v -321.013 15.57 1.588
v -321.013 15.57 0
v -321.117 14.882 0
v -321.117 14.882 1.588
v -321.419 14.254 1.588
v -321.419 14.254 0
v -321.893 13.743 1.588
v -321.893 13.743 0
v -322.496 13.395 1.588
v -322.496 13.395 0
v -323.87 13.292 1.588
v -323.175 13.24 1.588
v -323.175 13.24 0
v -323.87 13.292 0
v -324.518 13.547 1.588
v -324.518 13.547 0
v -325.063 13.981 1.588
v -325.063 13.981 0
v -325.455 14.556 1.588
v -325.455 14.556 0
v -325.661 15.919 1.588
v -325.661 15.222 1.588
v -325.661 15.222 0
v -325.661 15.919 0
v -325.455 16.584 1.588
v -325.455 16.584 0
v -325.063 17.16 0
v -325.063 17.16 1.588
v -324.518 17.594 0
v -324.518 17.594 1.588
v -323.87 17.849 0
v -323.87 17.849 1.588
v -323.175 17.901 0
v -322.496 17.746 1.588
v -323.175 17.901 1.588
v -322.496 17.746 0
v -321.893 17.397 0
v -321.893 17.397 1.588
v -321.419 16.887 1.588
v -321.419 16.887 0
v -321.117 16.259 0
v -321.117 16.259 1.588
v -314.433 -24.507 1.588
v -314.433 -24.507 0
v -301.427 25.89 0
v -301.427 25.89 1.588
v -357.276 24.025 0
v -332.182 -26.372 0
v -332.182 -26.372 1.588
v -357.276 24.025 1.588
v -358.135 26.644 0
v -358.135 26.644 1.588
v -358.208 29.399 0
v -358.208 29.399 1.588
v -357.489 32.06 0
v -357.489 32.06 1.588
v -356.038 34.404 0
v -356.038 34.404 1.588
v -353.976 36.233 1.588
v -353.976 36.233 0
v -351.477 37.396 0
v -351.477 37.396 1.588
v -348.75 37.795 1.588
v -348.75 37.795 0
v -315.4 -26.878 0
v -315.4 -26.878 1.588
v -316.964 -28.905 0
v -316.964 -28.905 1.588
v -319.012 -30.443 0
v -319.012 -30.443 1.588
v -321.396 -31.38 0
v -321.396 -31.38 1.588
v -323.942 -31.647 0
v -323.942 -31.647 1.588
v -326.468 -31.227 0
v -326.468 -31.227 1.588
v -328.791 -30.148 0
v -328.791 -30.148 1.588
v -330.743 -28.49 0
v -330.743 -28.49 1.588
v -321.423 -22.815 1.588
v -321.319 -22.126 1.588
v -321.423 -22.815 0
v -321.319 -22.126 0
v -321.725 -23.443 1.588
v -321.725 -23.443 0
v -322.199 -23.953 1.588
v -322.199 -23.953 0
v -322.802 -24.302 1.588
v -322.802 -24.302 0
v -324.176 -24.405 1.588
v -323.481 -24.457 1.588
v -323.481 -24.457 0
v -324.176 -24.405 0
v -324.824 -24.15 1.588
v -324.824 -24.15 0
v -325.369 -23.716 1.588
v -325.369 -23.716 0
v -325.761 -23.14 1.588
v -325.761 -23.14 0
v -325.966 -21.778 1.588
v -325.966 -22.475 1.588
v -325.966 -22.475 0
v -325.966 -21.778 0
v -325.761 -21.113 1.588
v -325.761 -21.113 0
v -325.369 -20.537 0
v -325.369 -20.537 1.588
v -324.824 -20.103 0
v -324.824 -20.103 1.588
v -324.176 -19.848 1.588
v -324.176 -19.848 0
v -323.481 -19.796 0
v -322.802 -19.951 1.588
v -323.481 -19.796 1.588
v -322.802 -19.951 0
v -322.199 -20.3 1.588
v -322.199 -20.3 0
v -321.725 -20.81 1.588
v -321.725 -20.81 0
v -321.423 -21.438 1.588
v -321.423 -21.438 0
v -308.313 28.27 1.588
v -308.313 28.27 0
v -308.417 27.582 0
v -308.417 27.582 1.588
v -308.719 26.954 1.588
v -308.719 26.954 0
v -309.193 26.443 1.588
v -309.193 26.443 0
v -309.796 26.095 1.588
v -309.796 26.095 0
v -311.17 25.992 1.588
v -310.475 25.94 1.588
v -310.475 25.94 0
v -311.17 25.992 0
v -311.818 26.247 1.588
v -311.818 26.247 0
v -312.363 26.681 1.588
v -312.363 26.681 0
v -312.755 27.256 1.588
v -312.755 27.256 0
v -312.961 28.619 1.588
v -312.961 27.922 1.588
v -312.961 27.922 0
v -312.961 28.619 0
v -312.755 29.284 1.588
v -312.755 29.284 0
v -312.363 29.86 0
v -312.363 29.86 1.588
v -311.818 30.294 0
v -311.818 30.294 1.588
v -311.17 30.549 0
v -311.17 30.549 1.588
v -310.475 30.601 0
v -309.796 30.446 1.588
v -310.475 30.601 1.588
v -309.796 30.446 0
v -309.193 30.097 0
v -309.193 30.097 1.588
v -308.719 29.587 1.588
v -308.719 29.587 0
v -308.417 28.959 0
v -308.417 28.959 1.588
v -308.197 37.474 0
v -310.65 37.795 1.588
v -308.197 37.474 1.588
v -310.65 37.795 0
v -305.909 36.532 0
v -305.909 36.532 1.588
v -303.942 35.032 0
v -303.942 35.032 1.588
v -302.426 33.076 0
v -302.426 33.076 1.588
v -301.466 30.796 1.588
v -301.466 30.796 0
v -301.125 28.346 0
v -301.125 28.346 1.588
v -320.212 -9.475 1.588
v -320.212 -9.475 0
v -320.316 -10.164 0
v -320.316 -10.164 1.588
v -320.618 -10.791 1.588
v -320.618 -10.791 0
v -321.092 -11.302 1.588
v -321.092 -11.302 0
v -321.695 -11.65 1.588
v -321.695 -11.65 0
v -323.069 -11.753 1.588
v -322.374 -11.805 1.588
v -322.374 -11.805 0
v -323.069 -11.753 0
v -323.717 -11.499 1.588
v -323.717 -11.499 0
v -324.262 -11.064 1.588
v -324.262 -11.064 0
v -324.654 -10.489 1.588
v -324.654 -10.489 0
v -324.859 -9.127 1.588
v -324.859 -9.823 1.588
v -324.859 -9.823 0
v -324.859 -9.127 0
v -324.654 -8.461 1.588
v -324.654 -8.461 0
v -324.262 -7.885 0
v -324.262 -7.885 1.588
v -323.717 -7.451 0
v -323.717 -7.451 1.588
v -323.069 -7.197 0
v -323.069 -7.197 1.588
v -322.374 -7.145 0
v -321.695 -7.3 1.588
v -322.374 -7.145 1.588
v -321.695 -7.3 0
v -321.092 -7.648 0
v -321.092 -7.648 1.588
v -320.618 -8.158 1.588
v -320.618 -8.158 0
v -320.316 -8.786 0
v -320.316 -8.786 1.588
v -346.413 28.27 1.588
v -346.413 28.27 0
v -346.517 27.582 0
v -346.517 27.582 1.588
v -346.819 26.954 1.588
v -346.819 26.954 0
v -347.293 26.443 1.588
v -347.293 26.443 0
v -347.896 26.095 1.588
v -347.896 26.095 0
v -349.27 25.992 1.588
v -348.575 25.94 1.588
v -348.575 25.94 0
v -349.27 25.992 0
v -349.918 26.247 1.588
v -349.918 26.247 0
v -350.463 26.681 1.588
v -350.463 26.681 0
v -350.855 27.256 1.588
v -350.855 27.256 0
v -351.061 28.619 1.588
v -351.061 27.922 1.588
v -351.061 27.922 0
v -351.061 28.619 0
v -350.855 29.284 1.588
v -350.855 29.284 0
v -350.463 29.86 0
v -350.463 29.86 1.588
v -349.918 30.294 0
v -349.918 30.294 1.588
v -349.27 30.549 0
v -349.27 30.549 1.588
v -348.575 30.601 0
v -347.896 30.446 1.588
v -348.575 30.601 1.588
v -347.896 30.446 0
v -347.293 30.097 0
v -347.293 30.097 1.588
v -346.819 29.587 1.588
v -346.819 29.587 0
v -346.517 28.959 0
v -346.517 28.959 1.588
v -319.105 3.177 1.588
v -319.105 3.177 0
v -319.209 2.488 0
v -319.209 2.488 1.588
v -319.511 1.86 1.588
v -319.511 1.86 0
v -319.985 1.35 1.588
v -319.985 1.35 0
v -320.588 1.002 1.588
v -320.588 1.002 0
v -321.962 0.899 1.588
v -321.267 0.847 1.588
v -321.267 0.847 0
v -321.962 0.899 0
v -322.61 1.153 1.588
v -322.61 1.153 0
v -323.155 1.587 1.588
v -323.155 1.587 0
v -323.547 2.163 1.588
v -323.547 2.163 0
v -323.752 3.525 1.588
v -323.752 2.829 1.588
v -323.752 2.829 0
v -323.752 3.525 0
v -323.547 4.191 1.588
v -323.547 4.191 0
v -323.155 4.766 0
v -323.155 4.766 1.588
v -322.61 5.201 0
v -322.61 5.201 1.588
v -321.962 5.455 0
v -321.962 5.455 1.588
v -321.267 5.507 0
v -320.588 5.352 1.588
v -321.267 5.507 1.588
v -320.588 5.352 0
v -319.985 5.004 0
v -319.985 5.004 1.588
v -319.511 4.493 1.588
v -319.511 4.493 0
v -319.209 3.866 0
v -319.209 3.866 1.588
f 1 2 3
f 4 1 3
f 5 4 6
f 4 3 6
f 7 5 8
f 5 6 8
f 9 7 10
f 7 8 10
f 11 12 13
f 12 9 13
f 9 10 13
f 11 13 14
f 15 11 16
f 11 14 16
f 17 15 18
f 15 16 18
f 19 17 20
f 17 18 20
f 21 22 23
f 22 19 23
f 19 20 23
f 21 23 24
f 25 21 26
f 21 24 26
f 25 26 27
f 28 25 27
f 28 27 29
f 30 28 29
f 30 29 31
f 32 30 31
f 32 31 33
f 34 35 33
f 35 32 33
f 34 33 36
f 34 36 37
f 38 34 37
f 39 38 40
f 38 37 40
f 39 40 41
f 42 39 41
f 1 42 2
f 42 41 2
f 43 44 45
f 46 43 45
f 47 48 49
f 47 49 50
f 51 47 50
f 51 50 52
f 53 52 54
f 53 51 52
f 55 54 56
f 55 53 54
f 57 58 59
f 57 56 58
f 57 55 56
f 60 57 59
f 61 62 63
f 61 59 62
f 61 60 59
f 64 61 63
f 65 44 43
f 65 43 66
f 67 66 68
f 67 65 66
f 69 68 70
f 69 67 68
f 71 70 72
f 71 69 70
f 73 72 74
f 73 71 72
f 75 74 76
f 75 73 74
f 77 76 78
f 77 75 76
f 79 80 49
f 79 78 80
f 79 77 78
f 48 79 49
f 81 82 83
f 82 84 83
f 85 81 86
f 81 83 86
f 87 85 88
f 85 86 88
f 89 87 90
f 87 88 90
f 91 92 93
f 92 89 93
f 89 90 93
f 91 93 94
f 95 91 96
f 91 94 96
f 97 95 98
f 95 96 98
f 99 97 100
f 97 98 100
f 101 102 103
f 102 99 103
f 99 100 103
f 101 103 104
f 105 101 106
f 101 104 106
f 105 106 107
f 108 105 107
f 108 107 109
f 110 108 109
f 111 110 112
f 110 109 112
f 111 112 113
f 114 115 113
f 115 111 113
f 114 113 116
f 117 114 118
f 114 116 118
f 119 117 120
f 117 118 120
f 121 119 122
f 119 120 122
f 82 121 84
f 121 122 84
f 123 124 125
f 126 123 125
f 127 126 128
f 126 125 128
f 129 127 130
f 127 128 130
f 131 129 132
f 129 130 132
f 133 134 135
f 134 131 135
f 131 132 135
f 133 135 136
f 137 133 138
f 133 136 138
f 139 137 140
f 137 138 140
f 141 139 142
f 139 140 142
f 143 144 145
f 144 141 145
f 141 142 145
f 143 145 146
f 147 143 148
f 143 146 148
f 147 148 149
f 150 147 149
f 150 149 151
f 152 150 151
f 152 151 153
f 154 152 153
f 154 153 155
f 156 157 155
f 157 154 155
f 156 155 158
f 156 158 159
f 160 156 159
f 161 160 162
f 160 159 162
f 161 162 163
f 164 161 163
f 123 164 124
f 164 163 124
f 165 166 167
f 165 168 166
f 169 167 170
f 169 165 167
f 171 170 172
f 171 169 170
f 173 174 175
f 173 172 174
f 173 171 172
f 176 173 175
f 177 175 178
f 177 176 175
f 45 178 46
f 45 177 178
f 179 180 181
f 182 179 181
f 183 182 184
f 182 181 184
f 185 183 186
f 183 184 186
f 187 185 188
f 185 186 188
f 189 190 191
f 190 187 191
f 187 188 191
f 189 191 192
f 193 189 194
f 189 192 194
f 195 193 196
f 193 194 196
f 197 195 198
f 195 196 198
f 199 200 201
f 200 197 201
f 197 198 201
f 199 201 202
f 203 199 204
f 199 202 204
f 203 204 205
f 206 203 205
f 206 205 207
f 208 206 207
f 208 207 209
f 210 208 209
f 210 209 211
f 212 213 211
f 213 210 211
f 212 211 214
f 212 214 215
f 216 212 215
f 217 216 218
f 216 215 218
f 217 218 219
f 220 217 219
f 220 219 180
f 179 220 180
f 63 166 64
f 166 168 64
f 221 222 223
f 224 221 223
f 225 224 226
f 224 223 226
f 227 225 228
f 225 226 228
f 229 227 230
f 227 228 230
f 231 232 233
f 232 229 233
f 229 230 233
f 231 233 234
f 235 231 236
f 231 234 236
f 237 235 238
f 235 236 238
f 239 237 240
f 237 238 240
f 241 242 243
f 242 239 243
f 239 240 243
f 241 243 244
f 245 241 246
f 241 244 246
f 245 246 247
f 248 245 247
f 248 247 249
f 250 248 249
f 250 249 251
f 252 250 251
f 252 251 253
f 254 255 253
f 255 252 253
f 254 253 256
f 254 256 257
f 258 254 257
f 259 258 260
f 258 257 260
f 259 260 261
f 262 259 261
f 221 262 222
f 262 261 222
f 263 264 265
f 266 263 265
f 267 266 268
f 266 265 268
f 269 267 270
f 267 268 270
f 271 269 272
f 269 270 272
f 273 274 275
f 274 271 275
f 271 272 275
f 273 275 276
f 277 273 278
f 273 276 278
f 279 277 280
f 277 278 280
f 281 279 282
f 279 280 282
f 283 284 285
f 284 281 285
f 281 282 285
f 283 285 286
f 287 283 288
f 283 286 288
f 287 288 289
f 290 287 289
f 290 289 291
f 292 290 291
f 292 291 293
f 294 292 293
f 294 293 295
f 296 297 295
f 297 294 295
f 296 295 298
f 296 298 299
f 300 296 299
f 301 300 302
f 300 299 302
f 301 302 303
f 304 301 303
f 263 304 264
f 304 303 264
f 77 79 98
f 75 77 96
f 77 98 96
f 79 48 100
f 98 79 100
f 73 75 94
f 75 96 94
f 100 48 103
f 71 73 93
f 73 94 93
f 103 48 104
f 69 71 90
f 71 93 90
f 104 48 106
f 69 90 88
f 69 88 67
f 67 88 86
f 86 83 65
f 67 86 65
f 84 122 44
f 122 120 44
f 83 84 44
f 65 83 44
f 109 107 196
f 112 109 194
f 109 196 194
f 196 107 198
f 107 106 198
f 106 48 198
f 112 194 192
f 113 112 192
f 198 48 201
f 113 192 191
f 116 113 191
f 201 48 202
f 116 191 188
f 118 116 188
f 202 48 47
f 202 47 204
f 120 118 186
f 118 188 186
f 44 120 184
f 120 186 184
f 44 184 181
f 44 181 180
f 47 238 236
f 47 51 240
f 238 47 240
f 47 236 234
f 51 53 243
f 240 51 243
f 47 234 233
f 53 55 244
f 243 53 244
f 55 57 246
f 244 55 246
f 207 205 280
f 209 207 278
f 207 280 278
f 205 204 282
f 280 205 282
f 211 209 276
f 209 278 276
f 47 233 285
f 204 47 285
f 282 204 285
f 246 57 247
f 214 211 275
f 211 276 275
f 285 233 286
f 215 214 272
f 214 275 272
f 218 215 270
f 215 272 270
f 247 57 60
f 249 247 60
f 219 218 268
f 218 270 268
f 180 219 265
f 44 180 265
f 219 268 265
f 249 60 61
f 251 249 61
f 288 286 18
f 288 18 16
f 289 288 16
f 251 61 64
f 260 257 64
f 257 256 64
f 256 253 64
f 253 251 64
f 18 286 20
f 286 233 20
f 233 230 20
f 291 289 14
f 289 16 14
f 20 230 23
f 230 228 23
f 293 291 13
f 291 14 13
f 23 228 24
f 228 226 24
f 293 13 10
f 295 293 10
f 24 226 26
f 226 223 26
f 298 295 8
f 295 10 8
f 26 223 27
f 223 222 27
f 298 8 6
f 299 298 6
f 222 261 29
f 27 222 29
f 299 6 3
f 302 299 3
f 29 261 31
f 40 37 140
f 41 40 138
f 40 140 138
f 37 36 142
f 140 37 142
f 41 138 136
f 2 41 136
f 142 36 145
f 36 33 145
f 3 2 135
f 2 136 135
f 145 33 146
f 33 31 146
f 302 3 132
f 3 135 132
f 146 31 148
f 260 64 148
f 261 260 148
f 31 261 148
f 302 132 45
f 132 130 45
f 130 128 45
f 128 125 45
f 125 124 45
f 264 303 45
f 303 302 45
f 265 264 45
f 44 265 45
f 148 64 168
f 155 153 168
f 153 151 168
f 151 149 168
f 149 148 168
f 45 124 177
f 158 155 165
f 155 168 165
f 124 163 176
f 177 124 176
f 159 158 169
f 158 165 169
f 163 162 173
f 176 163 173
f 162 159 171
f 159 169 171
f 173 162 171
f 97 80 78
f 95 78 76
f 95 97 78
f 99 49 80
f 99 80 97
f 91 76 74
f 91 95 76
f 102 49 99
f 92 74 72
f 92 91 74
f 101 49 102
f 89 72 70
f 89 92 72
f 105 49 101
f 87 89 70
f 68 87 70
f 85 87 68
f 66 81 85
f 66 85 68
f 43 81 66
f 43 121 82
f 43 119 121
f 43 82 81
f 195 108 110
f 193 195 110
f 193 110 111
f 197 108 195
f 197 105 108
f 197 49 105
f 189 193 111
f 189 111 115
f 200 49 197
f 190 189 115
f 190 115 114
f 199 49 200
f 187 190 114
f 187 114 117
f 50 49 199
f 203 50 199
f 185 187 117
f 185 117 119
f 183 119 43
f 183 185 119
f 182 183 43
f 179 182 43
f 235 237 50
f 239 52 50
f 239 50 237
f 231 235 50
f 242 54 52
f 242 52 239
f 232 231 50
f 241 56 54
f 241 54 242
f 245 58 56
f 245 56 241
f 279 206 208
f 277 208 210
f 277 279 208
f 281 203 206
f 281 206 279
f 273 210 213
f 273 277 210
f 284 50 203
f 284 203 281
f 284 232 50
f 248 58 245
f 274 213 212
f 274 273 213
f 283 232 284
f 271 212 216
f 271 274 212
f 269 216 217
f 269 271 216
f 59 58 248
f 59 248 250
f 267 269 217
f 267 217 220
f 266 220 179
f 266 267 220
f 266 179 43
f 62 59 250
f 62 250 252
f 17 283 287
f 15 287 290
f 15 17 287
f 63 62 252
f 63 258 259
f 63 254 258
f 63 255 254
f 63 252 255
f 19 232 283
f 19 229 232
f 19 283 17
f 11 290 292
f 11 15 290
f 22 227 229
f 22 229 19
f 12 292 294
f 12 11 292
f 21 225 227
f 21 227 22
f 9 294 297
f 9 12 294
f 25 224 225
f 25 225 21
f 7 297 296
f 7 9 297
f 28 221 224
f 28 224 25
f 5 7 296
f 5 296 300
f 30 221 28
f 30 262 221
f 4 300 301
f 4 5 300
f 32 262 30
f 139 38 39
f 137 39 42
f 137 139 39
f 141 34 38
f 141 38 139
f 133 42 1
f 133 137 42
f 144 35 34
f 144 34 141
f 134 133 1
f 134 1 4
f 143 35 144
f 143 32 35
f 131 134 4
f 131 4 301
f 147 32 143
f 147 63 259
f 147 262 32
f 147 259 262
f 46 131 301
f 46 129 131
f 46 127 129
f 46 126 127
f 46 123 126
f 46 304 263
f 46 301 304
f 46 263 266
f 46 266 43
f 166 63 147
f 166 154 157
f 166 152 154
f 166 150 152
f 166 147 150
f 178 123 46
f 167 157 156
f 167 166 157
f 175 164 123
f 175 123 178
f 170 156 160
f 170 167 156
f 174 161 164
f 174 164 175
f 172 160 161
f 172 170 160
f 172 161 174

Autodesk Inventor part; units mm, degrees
ref_plane "YZ Plane" through (0, 0, 0) normal (1, 0, 0) x (0, 1, 0)
ref_plane "XZ Plane" through (0, 0, 0) normal (0, 1, 0) x (-1, 0, 0)
ref_plane "XY Plane" through (0, 0, 0) normal (0, 0, 1) x (1, 0, 0)
sketch "Sketch1" plane through (0, 0, 0) normal (0, 0, 1) x (1, 0, 0)
  circle A0 centre (-322.5487, -9.4748) radius 2.3368
  circle A1 centre (-321.4418, 3.1768) radius 2.3368
  circle A2 centre (-323.6556, -22.1265) radius 2.3368
  line L0 (-321.4418, 3.1768) -> (-321.0479, 7.6801) construction
  circle A3 centre (-367.8, 21.9203) radius 2.3114 construction
  line L1 (-378.0119, 9.2203) -> (-319.4881, 9.2203) construction
  circle A4 centre (-323.6556, -22.1265) radius 9.525
  circle A5 centre (-321.4418, 3.1768) radius 9.525
  circle A6 centre (-310.65, 28.2703) radius 2.3114 construction
  circle A7 centre (-323.35, 15.5703) radius 2.3114 construction
  circle A8 centre (-348.75, 28.2703) radius 9.525
  circle A9 centre (-310.65, 28.2703) radius 9.525
  line L2 (-332.182, -26.3721) -> (-357.2764, 24.0247)
  line L3 (-312.0866, 0.8208) -> (-311.9531, 2.3467)
  line L4 (-312.6917, -0.5863) -> (-312.0866, 0.8208)
  line L5 (-310.65, 37.7953) -> (-348.75, 37.7953)
  line L6 (-346.4386, 30.0737) -> (-346.4386, 26.4669) construction
  circle A10 centre (-348.75, 28.2703) radius 2.3114 construction
  circle A11 centre (-348.75, 28.2703) radius 2.3368
  circle A12 centre (-310.65, 28.2703) radius 2.3368
  circle A13 centre (-323.35, 15.5703) radius 2.3368
  circle A14 centre (-321.4418, 3.1768) radius 1.5848 construction
  circle A15 centre (-321.4418, 3.1768) radius 1.5848 construction
  line L7 (-314.4328, -24.5066) -> (-301.4272, 25.8902)
  point P0 (0, 0)
  point P1 (-319.4881, 34.6203)
  point P2 (-314.4552, -24.5918)
  point P3 (-301.8999, 24.5072)
  point P4 (-312.4196, 0.0464)
  dimension "d0" = 4.6736
  dimension "d1" = 4.6736
  dimension "d2" = 4.6736
  dimension "d5" = 0
  dimension "d6" = 0
  dimension "d8" = 85
  dimension "d9" = 19.05
  dimension "d10" = 19.05
  dimension "d11" = 19.05
  dimension "d12" = 19.05
  dimension "d13" = 0
  dimension "d14" = 0
  dimension "d15" = 4.6736
  dimension "d16" = 4.6736
  dimension "d17" = 4.6736
  dimension "d20" = 0
  dimension "d22" = 12.7
  dimension "d23" = 12.7
  dimension "d24" = 0
extrude "Extrusion2" add sketch "Sketch1" along normal blind 1.5875 contours A4 | A4 L2 A8 L5 A9 L7 | A8 | A9 | A5
sketch "Sketch2" plane through (0, 0, 1.5875) normal (0, 0, 1) x (1, 0, 0)
  arc A0 (-312.6917, -0.5863) -> (-311.9531, 2.3467) centre (-321.4418, 3.1768) ccw
  line L0 (-312.0866, 0.8208) -> (-312.6917, -0.5863)
  line L1 (-311.9531, 2.3467) -> (-312.0866, 0.8208)
  arc A1 (-301.4272, 25.8902) -> (-310.65, 37.7953) centre (-310.65, 28.2703) ccw
  line L2 (-310.65, 37.7953) -> (-348.75, 37.7953)
  arc A2 (-348.75, 37.7953) -> (-357.2764, 24.0247) centre (-348.75, 28.2703) ccw
  line L3 (-357.2764, 24.0247) -> (-332.182, -26.3721)
  arc A3 (-332.182, -26.3721) -> (-314.4328, -24.5066) centre (-323.6556, -22.1265) ccw
  line L4 (-314.4328, -24.5066) -> (-301.4272, 25.8902)
  circle A4 centre (-321.4418, 3.1768) radius 2.3368
  circle A5 centre (-323.6556, -22.1265) radius 2.3368
  circle A6 centre (-348.75, 28.2703) radius 2.3368
  circle A7 centre (-310.65, 28.2703) radius 2.3368
  circle A8 centre (-323.35, 15.5703) radius 2.3368
  circle A9 centre (-322.5487, -9.4748) radius 2.3368
  line L5 (-312.0866, 0.8208) -> (-312.6917, -0.5863)
  arc A10 (-312.6917, -0.5863) -> (-311.9531, 2.3467) centre (-321.4418, 3.1768) ccw
  line L6 (-311.9531, 2.3467) -> (-312.0866, 0.8208)
  point P0 (0, 0)
sheet face with bend "Face1" sketch "Sketch2" thickness 1.5875 toward (0, 0, -1) bend radius 1.5875 contours A0 L1 L0
bend "Bend1"
equation "\"d27\" = Thickness"
equation "\"d28\" = BendRadius"
equation "\"d29\" = BendReliefWidth"
equation "\"d31\" = MinimumRemnant"
equation "\"d30\" = BendReliefDepth"
equation "\"d32\" = TransitionRadius"
equation "\"BendRadius\" = Thickness"
equation "\"BendReliefWidth\" = Thickness"
equation "\"BendReliefDepth\" = 0.5 * Thickness"
equation "\"CornerReliefSize\" = 4 * Thickness"
equation "\"MinimumRemnant\" = 2 * Thickness"
equation "\"TransitionRadius\" = BendRadius"
equation "\"JacobiRadiusSize\" = BendRadius"
equation "\"GapSize\" = Thickness"
equation "\"Thickness\" = 1.5875"
properties part number "motormount"
